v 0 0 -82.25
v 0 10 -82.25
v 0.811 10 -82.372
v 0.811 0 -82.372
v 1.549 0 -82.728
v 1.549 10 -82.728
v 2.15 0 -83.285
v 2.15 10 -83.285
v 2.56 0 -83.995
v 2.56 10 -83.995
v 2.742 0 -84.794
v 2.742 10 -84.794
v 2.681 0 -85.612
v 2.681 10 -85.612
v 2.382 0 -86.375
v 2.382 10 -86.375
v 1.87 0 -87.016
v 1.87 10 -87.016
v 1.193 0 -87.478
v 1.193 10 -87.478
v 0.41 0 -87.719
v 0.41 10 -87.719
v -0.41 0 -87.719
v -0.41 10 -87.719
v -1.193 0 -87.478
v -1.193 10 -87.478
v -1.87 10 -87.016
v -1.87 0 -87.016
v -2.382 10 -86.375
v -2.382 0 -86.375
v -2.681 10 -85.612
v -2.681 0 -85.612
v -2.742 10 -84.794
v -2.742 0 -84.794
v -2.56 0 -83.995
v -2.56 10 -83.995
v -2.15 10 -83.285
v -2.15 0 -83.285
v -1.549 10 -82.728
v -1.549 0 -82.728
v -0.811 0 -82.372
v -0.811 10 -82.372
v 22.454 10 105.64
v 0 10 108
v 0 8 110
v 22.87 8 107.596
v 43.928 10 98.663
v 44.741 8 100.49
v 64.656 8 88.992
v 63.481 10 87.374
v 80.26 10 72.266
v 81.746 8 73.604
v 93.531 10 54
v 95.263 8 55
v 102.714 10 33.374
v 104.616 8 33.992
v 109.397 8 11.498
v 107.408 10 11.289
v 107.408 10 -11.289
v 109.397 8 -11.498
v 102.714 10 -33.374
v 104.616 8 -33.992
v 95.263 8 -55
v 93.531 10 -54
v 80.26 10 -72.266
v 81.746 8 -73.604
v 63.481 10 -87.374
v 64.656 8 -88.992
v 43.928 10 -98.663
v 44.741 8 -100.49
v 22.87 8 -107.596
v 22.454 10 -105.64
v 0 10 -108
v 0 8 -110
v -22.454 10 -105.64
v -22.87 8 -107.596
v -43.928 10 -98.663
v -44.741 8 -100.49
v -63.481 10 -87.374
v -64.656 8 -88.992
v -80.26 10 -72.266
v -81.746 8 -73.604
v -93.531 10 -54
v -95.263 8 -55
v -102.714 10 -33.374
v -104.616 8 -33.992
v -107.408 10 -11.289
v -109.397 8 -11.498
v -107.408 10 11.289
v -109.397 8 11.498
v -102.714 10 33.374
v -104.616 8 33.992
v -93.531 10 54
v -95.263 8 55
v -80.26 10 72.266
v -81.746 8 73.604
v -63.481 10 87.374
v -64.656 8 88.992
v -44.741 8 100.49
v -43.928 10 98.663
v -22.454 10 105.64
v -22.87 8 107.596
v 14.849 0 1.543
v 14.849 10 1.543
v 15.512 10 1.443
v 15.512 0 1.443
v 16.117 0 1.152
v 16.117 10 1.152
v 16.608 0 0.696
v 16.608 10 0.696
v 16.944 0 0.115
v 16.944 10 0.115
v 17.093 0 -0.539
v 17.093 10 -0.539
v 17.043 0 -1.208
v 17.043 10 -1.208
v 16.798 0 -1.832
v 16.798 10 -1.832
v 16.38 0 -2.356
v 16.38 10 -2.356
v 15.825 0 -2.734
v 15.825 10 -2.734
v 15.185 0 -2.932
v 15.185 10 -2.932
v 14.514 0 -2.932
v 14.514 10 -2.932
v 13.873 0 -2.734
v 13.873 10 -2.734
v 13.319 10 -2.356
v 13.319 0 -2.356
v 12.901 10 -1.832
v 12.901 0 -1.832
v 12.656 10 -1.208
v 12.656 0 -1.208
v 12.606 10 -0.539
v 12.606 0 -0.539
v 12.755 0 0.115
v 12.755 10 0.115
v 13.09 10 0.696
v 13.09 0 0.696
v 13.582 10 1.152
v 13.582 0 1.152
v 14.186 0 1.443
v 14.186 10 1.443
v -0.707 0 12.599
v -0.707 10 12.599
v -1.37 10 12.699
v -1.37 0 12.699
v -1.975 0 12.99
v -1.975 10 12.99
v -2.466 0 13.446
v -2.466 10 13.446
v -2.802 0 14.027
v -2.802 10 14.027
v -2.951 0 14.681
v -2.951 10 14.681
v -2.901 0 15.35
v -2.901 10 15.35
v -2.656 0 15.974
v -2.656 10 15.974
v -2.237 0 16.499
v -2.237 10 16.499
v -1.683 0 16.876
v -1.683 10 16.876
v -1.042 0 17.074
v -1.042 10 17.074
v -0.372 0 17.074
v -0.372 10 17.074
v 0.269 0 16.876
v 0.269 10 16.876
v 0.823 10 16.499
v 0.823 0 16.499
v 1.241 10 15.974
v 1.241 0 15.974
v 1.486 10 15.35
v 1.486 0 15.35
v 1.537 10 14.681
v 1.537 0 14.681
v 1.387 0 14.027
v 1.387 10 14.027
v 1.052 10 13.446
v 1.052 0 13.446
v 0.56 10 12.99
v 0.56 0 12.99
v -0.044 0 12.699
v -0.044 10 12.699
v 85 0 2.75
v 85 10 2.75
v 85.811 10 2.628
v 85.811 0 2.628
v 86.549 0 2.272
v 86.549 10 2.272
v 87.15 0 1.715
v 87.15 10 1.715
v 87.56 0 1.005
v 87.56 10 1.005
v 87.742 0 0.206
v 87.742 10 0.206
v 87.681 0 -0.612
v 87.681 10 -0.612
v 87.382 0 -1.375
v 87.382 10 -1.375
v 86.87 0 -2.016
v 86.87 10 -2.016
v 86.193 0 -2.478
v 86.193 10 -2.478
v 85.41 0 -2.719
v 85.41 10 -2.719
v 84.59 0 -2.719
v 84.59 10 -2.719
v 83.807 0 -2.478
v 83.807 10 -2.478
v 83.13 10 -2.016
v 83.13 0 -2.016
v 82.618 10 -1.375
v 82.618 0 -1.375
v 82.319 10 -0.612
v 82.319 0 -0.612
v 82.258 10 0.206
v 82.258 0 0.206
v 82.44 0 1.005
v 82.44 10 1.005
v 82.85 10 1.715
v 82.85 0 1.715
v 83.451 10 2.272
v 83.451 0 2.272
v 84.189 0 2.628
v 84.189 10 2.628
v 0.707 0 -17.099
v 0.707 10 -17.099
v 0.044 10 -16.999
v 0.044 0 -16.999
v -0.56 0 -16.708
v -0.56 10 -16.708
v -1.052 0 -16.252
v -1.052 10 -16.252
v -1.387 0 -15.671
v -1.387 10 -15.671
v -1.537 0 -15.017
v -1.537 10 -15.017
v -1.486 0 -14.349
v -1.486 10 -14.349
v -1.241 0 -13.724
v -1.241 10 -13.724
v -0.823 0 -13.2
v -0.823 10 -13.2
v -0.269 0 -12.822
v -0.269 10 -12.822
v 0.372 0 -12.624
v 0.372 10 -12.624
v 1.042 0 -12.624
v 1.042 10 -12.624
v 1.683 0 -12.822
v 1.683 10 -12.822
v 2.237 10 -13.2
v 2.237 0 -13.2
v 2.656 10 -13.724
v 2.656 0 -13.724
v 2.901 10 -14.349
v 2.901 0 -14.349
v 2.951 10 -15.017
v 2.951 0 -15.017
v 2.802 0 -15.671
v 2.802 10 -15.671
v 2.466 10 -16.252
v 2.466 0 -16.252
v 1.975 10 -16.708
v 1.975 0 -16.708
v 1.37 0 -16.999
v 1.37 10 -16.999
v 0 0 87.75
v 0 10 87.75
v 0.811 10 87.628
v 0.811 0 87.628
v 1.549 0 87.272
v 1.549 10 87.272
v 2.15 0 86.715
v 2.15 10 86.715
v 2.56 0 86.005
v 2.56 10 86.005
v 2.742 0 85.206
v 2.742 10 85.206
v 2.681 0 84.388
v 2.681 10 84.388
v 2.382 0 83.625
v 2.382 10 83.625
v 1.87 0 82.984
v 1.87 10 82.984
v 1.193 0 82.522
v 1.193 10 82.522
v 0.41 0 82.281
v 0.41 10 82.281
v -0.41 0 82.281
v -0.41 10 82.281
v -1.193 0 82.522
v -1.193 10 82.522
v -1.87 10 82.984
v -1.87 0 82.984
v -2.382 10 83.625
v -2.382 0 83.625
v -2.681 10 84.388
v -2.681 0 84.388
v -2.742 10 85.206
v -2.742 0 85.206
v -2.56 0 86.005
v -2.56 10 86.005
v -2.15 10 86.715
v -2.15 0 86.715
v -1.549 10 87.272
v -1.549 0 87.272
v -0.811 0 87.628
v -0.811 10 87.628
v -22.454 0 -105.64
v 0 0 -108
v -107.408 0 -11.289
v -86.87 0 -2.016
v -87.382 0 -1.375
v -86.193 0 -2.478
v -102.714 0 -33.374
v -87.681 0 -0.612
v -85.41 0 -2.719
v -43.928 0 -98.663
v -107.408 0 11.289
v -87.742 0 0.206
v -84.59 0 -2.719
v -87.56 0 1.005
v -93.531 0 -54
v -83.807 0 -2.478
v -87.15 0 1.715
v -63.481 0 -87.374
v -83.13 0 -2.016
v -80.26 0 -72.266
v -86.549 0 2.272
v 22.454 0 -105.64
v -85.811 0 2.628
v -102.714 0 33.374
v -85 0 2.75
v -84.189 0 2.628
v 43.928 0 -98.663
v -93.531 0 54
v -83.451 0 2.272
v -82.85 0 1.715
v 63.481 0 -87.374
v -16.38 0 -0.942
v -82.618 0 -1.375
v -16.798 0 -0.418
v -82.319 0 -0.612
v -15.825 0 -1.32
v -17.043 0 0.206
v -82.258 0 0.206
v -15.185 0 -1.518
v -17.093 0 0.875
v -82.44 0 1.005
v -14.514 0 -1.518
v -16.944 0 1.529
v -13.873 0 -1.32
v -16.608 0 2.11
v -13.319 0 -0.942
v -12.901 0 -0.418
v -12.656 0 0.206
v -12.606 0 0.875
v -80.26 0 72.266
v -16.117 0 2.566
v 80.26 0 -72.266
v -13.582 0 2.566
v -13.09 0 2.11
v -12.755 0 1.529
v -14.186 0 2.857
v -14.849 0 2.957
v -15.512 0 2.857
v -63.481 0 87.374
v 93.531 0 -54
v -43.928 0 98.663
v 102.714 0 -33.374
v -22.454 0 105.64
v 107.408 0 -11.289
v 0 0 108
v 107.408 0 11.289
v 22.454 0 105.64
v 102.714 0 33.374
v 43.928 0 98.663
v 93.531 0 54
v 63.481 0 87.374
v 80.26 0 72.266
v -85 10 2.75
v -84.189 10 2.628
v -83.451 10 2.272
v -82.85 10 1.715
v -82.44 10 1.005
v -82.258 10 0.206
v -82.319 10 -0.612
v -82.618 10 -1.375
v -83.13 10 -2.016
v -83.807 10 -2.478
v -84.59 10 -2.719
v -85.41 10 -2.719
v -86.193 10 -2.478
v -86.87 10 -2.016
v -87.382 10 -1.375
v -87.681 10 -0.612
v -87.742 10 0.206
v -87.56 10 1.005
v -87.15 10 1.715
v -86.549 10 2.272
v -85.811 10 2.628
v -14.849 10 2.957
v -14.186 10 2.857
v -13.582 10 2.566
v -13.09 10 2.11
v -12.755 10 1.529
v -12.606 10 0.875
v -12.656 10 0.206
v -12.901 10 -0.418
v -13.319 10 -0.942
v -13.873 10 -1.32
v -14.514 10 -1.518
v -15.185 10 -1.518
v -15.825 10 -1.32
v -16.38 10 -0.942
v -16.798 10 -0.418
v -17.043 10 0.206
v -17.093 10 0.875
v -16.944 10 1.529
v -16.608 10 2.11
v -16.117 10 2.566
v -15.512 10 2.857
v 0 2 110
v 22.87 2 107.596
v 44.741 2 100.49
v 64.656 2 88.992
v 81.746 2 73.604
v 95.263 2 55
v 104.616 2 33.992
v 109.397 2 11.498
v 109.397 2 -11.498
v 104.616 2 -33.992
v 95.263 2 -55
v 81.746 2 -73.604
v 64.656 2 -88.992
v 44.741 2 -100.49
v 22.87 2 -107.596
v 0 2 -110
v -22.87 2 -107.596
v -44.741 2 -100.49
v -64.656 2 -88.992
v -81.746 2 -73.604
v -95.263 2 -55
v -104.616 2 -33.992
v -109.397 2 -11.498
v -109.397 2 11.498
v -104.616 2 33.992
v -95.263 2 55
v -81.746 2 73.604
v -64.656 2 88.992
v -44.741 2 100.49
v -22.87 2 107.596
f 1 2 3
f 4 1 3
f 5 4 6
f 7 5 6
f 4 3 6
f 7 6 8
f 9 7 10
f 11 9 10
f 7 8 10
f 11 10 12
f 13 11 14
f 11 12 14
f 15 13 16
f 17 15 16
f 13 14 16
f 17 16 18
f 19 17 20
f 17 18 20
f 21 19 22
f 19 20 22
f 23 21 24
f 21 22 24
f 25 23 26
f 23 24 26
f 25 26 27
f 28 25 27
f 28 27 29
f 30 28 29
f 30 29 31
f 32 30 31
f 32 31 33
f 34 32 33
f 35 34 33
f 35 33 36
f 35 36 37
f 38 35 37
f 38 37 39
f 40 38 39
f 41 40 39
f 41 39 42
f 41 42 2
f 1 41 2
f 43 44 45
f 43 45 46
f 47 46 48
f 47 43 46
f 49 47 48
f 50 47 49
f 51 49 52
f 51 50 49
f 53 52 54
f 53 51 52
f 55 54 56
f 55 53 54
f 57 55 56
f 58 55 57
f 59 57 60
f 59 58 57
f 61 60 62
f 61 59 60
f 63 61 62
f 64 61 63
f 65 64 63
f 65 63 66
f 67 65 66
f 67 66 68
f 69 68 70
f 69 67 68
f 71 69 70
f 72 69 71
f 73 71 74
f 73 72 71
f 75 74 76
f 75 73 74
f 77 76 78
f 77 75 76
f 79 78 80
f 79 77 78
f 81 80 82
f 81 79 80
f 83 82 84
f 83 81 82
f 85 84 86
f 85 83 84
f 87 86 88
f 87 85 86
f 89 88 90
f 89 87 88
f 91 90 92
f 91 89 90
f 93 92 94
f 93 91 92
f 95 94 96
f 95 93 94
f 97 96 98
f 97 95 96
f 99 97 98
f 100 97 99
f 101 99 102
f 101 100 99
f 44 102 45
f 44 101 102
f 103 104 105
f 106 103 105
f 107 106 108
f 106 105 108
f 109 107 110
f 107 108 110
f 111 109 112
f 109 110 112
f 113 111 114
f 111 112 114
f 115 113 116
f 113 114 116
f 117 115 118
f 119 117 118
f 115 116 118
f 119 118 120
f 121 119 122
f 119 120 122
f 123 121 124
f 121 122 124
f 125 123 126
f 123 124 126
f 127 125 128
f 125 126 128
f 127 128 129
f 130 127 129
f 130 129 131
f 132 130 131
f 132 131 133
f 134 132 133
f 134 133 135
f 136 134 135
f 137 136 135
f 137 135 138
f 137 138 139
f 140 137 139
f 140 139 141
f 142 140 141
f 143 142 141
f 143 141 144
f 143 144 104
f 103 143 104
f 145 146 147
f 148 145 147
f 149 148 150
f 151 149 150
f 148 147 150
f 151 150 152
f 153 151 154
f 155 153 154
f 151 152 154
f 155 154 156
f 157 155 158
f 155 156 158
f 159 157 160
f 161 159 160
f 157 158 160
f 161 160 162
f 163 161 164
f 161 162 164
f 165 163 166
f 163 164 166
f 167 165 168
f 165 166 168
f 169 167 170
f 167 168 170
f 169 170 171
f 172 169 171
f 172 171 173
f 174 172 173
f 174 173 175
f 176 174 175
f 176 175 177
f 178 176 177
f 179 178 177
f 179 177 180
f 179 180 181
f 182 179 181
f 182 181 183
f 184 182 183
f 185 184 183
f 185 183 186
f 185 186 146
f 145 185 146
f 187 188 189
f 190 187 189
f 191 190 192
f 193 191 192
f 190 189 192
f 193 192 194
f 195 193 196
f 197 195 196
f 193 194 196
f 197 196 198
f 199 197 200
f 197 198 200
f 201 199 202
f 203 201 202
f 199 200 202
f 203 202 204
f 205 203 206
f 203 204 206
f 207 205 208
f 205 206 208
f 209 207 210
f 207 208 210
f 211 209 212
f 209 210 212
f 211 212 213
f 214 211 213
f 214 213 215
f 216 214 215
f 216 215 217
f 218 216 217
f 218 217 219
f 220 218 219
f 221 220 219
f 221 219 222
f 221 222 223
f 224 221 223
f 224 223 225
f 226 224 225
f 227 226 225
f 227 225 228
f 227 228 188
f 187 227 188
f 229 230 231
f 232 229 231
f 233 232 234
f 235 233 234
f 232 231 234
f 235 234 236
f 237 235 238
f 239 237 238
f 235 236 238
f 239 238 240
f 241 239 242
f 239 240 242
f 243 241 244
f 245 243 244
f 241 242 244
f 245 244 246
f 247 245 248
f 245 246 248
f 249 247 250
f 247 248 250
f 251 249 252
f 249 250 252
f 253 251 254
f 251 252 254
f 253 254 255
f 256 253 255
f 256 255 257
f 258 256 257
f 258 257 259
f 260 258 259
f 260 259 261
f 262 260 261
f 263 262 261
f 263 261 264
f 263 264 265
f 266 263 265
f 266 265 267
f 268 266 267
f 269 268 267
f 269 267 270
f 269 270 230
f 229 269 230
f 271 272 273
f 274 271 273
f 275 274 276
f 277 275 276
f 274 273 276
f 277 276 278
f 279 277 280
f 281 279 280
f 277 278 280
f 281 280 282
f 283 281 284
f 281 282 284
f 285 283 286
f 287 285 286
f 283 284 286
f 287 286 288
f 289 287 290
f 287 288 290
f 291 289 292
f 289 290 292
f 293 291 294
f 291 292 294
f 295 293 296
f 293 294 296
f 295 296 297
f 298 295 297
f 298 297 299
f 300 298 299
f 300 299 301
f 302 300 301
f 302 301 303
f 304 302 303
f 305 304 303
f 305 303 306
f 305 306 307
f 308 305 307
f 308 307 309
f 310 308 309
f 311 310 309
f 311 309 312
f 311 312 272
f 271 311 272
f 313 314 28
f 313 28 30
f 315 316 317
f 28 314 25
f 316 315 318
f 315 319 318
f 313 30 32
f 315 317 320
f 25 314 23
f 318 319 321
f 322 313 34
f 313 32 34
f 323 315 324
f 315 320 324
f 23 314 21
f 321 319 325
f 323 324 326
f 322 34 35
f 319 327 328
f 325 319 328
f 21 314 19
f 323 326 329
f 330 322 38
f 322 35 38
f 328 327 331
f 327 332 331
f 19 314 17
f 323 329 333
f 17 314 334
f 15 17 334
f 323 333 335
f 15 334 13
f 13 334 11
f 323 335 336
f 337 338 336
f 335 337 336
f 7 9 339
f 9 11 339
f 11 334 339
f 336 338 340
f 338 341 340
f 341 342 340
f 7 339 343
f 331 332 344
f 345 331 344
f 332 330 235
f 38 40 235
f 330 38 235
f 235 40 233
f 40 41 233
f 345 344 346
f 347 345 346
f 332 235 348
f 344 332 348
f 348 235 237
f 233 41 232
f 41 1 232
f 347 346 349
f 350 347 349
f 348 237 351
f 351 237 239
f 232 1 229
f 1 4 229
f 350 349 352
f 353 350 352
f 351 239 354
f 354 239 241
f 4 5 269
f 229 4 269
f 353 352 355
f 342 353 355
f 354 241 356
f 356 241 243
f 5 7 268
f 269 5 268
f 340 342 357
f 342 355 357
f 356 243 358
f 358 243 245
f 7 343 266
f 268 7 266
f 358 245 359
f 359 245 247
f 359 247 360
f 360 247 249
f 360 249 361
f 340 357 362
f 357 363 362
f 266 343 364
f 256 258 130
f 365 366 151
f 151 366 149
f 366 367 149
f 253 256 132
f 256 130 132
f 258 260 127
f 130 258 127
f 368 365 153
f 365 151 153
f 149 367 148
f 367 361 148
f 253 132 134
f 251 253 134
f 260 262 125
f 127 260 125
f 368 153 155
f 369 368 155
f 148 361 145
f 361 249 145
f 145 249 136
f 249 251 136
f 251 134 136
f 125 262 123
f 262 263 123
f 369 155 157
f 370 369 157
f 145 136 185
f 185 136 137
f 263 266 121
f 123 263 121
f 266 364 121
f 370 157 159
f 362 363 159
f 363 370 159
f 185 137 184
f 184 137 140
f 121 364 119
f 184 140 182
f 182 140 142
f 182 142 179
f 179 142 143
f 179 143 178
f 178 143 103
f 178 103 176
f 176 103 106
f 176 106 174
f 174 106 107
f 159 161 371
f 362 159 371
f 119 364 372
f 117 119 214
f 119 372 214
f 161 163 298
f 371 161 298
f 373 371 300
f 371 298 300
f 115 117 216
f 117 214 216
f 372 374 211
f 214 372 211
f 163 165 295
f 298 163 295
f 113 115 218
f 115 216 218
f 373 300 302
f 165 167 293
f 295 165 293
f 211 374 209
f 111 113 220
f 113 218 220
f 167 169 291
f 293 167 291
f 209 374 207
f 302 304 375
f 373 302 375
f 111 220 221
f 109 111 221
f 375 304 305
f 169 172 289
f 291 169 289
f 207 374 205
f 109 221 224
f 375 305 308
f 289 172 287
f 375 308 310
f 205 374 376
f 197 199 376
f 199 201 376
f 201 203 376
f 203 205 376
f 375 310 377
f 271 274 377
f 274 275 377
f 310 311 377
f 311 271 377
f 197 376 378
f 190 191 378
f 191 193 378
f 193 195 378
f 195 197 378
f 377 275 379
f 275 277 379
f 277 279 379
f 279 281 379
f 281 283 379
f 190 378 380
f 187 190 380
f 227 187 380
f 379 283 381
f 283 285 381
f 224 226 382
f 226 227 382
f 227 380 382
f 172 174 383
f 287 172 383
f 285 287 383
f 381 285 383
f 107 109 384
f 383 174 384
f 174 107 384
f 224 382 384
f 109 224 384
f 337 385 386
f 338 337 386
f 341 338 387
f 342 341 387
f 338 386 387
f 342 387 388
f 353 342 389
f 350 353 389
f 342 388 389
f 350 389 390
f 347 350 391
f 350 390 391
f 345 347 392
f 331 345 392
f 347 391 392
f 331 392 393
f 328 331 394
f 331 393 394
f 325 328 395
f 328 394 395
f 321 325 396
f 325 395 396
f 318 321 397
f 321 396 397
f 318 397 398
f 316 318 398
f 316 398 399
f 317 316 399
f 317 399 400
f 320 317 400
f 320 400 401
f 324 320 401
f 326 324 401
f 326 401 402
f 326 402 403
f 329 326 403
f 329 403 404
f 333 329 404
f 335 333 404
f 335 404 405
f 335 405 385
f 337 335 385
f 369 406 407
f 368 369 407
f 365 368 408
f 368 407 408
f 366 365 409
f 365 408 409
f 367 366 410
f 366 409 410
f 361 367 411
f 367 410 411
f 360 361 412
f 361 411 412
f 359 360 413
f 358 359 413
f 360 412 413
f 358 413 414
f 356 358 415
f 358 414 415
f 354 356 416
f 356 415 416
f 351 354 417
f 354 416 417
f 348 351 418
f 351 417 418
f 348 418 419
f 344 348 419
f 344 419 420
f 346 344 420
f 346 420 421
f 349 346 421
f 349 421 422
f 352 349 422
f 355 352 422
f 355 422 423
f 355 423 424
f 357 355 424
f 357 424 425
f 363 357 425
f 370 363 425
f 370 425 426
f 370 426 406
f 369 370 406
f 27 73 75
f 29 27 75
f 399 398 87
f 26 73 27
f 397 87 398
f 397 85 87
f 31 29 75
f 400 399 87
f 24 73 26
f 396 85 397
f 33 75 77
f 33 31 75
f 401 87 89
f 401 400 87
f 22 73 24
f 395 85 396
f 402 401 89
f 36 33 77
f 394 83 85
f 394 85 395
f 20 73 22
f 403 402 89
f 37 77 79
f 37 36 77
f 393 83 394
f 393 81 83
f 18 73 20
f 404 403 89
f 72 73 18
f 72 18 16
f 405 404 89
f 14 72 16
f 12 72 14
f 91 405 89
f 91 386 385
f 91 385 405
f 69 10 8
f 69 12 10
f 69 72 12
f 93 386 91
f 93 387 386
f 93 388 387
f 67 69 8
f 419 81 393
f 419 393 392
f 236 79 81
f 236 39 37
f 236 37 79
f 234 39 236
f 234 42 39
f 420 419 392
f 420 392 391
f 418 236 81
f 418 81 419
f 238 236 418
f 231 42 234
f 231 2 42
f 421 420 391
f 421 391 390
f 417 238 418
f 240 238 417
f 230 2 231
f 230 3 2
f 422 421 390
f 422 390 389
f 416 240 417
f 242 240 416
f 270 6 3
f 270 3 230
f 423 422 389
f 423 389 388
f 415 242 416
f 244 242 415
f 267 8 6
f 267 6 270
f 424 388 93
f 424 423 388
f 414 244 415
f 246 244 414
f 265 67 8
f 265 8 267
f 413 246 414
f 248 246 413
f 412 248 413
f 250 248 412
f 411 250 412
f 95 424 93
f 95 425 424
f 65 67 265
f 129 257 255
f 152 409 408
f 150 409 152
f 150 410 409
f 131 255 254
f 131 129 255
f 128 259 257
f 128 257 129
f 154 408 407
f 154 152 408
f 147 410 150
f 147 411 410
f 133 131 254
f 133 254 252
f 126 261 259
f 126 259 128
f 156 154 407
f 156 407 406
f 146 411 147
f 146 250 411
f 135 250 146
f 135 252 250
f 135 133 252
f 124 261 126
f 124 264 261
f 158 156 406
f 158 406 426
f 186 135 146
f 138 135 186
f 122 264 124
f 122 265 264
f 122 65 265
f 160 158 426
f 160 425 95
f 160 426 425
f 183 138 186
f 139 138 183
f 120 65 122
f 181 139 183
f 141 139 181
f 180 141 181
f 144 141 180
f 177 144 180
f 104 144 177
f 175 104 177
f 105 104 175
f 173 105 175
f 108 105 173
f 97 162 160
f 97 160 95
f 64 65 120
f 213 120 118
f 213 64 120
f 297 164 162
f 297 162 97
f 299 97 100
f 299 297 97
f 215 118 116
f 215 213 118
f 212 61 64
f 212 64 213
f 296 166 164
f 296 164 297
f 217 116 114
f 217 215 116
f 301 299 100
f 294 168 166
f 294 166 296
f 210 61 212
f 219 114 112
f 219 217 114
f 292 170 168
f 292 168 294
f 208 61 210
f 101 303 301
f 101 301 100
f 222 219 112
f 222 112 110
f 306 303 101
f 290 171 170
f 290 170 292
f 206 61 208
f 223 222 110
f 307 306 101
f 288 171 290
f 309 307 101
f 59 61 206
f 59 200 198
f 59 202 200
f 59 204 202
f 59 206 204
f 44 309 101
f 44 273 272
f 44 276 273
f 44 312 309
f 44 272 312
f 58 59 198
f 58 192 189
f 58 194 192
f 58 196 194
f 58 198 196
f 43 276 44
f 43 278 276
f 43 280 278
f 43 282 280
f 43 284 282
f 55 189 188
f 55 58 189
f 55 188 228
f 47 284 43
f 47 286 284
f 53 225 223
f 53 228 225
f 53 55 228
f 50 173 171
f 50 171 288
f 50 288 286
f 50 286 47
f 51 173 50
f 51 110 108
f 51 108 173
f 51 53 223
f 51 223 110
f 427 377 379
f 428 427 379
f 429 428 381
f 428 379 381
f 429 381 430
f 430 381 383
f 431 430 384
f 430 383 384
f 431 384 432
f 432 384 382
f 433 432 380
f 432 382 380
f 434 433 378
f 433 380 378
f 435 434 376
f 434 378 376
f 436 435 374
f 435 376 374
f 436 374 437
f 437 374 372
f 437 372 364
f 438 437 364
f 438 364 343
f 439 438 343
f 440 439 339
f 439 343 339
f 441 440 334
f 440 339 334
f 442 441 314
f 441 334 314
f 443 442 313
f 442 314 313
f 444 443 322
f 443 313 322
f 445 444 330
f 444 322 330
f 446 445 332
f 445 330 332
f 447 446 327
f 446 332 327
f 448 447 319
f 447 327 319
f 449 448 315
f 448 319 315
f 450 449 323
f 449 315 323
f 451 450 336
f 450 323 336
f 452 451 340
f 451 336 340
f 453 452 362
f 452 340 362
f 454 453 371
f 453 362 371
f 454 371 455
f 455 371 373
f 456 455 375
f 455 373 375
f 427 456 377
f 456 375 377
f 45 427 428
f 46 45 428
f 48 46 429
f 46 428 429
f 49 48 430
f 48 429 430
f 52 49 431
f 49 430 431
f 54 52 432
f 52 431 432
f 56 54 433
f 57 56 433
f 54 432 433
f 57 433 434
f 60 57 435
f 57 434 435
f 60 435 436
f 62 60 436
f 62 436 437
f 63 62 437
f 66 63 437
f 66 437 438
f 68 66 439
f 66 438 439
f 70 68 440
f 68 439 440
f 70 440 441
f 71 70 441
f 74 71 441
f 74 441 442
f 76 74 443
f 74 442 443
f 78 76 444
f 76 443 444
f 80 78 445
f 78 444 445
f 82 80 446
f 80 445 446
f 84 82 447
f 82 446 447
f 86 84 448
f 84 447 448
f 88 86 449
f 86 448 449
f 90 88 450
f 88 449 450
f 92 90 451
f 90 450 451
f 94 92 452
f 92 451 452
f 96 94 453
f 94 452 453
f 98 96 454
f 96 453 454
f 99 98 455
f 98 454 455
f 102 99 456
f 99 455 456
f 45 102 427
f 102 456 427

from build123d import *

# Parameters (mm, degrees)
SKETCH3_R                    = 110
BOSS_EXTRUDE_GB_BASEOD_DEPTH = 10
SKETCH4_R                    = 2.75
CUT_EXTRUDE1_DEPTH           = 156.884572681
CHAMFER1_SIZE                = 2
SKETCH7_R                    = 2.25
CUT_EXTRUDE2_DEPTH           = 156.884572681


with BuildPart() as part:
    # Sketch3 → Boss-Extrude_GB_BaseOD (new body)
    with BuildSketch(Plane(origin=(0, 0, 0), x_dir=(1, 0, 0), z_dir=(0, 1, 0))):
        with Locations(Location((0, 0, 0), (0, 0, 270))):
            Circle(SKETCH3_R)
    extrude(amount=BOSS_EXTRUDE_GB_BASEOD_DEPTH)

    # Sketch4 → Cut-Extrude1 (cut, through all)
    with BuildSketch(Plane(origin=(0, 10, 0), x_dir=(1, 0, 0), z_dir=(0, 1, 0))):
        with Locations(Location((-85, 0, 0), (0, 0, 270))):
            Circle(SKETCH4_R)
        with Locations(Location((0, 85, 0), (0, 0, 270))):
            Circle(SKETCH4_R)
        with Locations(Location((85, 0, 0), (0, 0, 270))):
            Circle(SKETCH4_R)
        with Locations(Location((0, -85, 0), (0, 0, 270))):
            Circle(SKETCH4_R)
    extrude(amount=-CUT_EXTRUDE1_DEPTH, mode=Mode.SUBTRACT)

    # Chamfer1
    chamfer1_edges = [part.edges().sort_by_distance(p)[0] for p in [
        (0, 0, -110),
        (0, 10, -110),
    ]]
    chamfer(chamfer1_edges, length=CHAMFER1_SIZE)

    # Sketch7 → Cut-Extrude2 (cut, through all)
    with BuildSketch(Plane(origin=(0, 10, 0), x_dir=(1, 0, 0), z_dir=(0, 1, 0))):
        with Locations(Location((14.849242405, 0.707106781, 0), (0, 0, 270))):
            Circle(SKETCH7_R)
        with Locations(Location((0.707106781, 14.849242405, 0), (0, 0, 90))):
            Circle(SKETCH7_R)
        with Locations(Location((-14.849242405, -0.707106781, 0), (0, 0, 270))):
            Circle(SKETCH7_R)
        with Locations(Location((-0.707106781, -14.849242405, 0), (0, 0, 90))):
            Circle(SKETCH7_R)
    extrude(amount=-CUT_EXTRUDE2_DEPTH, mode=Mode.SUBTRACT)


solid = part.part
